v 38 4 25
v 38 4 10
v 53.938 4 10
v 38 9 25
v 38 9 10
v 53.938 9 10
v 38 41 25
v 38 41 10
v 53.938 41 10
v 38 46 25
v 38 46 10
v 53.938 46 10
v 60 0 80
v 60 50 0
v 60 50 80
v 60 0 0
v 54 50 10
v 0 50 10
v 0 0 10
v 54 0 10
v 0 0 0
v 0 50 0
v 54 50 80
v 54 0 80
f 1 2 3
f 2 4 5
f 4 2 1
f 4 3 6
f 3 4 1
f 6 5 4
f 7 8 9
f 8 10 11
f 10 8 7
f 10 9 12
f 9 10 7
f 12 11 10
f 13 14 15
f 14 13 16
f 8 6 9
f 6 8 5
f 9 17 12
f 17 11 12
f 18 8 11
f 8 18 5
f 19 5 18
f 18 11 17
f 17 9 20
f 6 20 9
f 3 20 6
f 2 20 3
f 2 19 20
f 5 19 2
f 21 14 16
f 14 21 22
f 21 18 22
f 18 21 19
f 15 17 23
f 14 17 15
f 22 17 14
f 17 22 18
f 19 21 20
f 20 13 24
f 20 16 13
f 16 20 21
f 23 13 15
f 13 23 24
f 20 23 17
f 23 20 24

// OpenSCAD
$fn = 32;

// ----------------------------------------------------------------------
// Rib bracket: 2-gusset L bracket
// ----------------------------------------------------------------------

// --- parameters (mm) ---
base_l = 60;              // foot length, X
base_w = 50;              // foot width, Y
base_t = 10;              // foot thickness
plate_t = 6;              // upright plate thickness
plate_h = 80;             // overall height
gus_l = 16;               // gusset leg along the foot
gus_h = 16;               // gusset height
gus_t = 5;                // gusset thickness
gus_edge = 4;             // gusset margin from the foot edge
n_gus = 2;                // gusset count

gus_pitch = (base_w - 2 * gus_edge - gus_t) / (n_gus - 1);  // gusset pitch

union() {
  cube([base_l, base_w, base_t]);
  translate([base_l - plate_t, 0, base_t - 1])
    cube([plate_t, base_w, plate_h - base_t + 1]);
  for (i = [0 : n_gus - 1])
    translate([base_l - plate_t - gus_l, gus_edge + i * gus_pitch, base_t - 1])
      rotate([-90, 0, 0])
        linear_extrude(height = gus_t)
          polygon(points = [[0, 0], [gus_l + 1, 0], [0, -gus_h]]);
}
